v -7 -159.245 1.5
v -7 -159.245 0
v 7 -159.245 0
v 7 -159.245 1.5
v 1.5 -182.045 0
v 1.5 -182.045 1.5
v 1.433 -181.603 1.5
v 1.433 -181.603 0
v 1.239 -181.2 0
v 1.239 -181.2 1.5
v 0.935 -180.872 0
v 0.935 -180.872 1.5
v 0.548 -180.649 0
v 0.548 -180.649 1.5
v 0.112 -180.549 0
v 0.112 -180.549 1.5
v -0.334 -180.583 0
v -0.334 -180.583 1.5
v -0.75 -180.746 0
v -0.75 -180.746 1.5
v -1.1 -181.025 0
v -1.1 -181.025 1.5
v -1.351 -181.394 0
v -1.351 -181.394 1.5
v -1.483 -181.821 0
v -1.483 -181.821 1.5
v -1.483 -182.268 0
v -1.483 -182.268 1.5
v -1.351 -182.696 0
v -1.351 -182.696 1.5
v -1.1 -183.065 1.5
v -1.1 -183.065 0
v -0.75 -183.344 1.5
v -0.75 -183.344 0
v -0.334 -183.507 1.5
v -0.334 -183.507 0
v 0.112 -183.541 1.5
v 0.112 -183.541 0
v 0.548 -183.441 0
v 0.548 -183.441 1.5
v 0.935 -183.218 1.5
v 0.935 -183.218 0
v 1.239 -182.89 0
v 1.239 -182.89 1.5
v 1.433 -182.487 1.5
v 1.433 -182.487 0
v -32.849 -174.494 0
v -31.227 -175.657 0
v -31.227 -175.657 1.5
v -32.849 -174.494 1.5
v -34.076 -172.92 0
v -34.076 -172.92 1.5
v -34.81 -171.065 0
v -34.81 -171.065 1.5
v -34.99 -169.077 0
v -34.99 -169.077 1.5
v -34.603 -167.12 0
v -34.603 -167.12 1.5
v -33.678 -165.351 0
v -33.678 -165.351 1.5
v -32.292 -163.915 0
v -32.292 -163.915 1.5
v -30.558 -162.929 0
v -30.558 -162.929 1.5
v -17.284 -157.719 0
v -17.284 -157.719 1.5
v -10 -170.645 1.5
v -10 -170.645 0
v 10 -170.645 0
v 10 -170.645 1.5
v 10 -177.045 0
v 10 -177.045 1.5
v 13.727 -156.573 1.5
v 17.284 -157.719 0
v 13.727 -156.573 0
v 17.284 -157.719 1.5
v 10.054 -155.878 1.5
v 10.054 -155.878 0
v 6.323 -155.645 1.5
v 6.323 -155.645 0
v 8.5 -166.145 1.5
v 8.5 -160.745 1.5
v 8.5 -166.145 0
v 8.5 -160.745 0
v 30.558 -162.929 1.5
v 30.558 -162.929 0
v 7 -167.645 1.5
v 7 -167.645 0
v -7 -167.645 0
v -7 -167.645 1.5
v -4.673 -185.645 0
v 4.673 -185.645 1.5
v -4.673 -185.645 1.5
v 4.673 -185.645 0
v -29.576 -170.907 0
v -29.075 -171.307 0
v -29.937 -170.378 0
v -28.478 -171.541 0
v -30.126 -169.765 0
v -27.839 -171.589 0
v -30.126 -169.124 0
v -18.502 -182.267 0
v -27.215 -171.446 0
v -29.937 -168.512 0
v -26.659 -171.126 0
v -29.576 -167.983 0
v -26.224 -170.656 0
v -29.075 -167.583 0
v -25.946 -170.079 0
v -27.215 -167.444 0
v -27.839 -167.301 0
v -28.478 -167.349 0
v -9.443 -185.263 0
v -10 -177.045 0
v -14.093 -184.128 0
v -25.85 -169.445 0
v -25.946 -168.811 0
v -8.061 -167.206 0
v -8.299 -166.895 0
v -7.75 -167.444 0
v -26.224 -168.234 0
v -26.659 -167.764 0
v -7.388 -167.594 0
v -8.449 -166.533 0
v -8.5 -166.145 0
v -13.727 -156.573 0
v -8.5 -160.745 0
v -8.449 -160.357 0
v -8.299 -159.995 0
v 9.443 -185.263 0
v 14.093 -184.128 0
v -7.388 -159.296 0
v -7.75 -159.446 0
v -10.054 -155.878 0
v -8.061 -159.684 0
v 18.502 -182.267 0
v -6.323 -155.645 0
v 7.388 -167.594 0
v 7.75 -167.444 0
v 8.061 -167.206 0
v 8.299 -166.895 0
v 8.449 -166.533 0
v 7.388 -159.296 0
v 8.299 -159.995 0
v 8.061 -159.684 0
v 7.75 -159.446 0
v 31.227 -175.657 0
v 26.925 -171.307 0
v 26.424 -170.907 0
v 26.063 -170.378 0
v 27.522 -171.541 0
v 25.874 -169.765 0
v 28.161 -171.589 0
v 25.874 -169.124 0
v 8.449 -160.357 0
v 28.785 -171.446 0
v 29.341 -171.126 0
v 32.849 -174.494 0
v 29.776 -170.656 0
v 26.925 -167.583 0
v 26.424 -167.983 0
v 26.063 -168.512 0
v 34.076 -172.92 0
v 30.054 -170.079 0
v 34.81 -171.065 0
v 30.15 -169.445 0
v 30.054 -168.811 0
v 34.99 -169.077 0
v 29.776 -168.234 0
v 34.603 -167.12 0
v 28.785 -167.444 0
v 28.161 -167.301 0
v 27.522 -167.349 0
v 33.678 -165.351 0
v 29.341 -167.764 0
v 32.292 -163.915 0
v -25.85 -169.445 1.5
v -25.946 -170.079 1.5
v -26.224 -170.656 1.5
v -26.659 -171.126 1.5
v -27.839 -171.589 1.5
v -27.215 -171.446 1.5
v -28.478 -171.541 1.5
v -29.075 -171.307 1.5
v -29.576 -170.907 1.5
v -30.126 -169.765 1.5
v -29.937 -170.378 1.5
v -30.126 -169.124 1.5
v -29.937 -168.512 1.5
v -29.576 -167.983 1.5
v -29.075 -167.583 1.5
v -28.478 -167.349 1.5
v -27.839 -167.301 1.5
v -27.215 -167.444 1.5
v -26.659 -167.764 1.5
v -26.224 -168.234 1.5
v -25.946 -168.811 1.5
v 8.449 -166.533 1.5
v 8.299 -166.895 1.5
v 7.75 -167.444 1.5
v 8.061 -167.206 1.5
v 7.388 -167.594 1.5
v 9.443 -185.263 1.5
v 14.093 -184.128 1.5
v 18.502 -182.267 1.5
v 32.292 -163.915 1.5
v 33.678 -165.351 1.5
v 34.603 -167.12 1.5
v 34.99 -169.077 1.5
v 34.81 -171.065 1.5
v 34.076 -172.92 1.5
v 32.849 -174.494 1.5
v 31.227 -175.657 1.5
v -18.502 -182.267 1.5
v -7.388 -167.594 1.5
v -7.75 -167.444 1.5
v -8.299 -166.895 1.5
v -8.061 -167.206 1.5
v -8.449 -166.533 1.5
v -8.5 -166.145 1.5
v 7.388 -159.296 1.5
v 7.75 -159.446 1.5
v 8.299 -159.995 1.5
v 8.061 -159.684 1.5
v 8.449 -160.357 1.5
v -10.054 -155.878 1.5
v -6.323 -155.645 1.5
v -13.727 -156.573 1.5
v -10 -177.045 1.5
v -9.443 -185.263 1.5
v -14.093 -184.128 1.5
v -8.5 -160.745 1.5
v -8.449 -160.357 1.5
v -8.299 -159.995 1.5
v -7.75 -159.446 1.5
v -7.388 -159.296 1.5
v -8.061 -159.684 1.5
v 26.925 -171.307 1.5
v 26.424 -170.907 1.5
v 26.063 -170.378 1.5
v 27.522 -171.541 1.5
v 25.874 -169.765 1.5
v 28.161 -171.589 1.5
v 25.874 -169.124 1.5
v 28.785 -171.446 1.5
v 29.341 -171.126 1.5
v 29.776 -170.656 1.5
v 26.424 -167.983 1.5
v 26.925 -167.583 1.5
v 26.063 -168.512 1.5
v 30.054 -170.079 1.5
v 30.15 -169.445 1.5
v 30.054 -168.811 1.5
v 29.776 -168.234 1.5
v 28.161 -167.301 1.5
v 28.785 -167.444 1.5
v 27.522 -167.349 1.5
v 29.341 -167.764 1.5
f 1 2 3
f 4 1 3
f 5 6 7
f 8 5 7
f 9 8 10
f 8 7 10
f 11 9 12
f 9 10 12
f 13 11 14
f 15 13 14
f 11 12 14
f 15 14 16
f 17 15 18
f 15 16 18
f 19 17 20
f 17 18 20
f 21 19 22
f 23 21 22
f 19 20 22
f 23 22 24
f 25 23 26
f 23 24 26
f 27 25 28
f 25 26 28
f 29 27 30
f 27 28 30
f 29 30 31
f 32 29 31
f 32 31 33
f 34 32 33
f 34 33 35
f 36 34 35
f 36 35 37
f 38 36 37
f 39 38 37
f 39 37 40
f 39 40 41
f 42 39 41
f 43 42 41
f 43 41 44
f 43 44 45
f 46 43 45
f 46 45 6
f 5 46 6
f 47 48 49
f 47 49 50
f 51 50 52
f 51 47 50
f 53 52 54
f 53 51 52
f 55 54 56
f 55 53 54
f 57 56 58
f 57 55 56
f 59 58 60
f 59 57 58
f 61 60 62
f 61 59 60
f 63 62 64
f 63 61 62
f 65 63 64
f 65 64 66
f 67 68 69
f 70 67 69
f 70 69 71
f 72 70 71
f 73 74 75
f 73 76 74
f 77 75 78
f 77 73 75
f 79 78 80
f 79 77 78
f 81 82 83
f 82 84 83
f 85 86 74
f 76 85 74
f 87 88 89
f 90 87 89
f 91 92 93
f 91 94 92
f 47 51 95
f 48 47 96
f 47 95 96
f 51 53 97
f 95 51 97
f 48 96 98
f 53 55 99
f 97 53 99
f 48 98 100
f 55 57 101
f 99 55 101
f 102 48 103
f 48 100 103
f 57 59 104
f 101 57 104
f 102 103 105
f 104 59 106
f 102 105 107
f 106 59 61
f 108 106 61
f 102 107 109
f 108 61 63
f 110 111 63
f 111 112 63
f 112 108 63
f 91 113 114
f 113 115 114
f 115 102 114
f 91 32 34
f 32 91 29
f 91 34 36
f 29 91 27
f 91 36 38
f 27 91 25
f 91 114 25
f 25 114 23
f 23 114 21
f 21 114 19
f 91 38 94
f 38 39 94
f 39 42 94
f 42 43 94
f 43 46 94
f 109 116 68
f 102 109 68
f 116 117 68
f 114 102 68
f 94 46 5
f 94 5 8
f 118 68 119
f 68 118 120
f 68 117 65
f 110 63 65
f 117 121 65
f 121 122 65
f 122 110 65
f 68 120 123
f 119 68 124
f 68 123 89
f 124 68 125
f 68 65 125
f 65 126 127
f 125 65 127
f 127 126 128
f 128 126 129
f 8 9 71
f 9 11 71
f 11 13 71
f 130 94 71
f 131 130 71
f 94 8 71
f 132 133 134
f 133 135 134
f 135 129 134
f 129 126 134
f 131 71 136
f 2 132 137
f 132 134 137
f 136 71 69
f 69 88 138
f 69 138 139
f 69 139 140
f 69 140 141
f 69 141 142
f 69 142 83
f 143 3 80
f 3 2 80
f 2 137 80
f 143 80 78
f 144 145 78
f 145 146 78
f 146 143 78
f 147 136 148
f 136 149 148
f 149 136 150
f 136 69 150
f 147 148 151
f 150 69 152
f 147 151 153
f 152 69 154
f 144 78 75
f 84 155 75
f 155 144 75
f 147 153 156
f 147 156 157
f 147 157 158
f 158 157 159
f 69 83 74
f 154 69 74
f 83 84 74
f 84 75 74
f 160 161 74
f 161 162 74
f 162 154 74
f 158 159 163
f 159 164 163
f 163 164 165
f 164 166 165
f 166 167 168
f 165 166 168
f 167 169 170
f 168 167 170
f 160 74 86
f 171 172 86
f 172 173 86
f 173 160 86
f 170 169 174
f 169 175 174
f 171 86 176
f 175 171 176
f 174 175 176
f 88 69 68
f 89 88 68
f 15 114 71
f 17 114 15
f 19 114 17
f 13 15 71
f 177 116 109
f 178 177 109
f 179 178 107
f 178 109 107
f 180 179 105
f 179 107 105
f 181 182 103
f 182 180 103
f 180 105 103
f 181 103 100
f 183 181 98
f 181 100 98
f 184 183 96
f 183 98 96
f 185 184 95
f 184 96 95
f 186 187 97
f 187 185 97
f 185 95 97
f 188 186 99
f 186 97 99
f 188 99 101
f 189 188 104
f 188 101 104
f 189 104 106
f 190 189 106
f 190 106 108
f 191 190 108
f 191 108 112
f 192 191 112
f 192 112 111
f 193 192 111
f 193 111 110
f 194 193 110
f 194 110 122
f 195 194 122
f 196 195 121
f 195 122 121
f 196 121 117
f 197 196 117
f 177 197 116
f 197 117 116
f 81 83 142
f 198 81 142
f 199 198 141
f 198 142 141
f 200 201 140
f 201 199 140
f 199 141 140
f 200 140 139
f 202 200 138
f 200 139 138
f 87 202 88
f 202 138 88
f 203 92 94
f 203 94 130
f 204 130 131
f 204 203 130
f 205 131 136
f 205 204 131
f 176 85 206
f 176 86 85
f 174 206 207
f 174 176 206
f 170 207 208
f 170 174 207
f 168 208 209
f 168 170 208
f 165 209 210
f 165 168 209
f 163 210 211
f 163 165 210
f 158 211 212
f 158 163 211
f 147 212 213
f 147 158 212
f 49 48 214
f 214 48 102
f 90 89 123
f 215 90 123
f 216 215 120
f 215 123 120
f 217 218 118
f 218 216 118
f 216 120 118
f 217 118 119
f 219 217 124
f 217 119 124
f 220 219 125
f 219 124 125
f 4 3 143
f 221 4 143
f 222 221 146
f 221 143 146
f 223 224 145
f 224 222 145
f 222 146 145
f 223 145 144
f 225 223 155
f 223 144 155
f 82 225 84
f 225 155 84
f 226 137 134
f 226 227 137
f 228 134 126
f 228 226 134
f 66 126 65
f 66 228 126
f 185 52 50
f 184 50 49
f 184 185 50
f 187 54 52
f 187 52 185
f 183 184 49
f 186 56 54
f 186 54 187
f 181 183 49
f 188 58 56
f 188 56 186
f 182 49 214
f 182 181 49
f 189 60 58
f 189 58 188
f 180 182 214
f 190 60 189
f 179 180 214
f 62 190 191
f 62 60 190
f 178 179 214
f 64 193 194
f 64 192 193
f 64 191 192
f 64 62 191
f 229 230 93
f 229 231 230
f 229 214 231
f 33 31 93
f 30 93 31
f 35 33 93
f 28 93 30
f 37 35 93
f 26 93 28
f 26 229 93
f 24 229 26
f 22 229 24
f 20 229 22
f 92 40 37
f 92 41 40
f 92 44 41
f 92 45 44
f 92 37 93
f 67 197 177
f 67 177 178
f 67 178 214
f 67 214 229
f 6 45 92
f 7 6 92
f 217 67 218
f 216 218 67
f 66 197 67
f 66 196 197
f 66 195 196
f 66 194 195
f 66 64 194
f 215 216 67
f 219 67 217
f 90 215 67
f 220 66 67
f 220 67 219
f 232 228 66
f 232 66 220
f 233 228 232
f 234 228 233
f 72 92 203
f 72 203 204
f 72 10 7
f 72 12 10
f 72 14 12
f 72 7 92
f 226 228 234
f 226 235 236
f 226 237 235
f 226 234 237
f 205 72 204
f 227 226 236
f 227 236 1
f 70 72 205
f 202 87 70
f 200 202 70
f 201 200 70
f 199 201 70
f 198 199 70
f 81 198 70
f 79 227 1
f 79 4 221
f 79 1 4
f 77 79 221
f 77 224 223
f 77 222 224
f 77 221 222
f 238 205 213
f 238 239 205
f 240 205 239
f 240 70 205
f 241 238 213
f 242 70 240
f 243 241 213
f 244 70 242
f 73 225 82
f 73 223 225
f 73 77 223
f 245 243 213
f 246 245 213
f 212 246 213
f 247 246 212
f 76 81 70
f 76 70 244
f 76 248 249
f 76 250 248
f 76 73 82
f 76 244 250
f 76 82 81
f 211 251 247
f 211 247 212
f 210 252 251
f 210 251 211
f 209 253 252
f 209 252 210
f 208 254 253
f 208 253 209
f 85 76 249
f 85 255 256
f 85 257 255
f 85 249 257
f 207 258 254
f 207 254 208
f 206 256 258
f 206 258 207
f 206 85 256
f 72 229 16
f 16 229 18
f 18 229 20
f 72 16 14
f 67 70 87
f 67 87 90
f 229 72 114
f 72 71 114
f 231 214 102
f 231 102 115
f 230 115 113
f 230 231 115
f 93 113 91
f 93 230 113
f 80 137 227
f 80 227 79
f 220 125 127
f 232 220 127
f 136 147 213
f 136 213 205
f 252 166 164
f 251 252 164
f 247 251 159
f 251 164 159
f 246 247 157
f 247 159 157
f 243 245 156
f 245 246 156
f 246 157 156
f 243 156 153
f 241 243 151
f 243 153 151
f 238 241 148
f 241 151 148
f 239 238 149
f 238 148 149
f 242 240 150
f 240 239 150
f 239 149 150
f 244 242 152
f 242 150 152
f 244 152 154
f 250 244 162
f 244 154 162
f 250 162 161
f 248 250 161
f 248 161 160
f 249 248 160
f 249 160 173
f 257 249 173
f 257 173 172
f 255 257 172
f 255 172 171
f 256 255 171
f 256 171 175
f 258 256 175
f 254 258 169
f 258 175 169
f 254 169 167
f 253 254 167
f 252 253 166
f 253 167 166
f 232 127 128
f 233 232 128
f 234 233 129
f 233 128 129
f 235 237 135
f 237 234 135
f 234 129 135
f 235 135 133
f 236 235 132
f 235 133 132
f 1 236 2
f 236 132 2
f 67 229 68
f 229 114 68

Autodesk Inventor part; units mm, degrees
ref_plane "YZ Plane" through (0, 0, 0) normal (1, 0, 0) x (0, 1, 0)
ref_plane "XZ Plane" through (0, 0, 0) normal (0, 1, 0) x (-1, 0, 0)
ref_plane "XY Plane" through (0, 0, 0) normal (0, 0, 1) x (1, 0, 0)
ref_plane "Work Plane1" through (0, 0, 0) normal (0, 0, 1) x (1, 0, 0)
sketch "Sketch1" plane through (0, 0, 0) normal (0, 0, 1) x (1, 0, 0)
  arc A0 (-148.6847, 77.7603) -> (-148.1357, 75.7112) centre (-147.3857, 77.0103) ccw projected
  line L0 (-148.6847, 77.7603) -> (-148.1847, 78.6263) projected
  line L1 (-148.1847, 78.6263) -> (-150.7828, 80.1263) projected
  line L2 (-150.7828, 80.1263) -> (-152.7828, 76.6622) projected
  arc A1 (-155.3809, 78.1622) -> (-152.7828, 76.6622) centre (-154.0818, 77.4122) ccw projected
  line L3 (-155.3809, 78.1622) -> (-158.3253, 79.8622) projected
  arc A2 (-156.8253, 82.4603) -> (-158.3253, 79.8622) centre (-157.5753, 81.1612) ccw projected
  line L4 (-156.8253, 82.4603) -> (-156.3253, 83.3263) projected
  line L5 (-156.3253, 83.3263) -> (-161.1751, 86.1263) projected
  arc A3 (-159.9251, 88.2913) -> (-161.1751, 86.1263) centre (-160.5501, 87.2088) ccw projected
  line L6 (-159.9251, 88.2913) -> (-155.0753, 85.4913) projected
  line L7 (-155.0753, 85.4913) -> (-151.5753, 91.5535) projected
  line L8 (-151.5753, 91.5535) -> (-156.4251, 94.3535) projected
  arc A4 (-155.1751, 96.5186) -> (-156.4251, 94.3535) centre (-155.8001, 95.4361) ccw projected
  line L9 (-155.1751, 96.5186) -> (-150.3253, 93.7186) projected
  line L10 (-150.3253, 93.7186) -> (-149.8253, 94.5846) projected
  arc A5 (-148.3253, 97.1827) -> (-149.8253, 94.5846) centre (-149.0753, 95.8836) ccw projected
  line L11 (-148.3253, 97.1827) -> (-145.3809, 95.4827) projected
  arc A6 (-142.7828, 93.9827) -> (-145.3809, 95.4827) centre (-144.0818, 94.7327) ccw projected
  line L12 (-142.7828, 93.9827) -> (-144.7828, 90.5186) projected
  line L13 (-144.7828, 90.5186) -> (-142.1847, 89.0186) projected
  line L14 (-142.1847, 89.0186) -> (-141.6847, 89.8846) projected
  arc A7 (-139.6357, 90.4336) -> (-141.6847, 89.8846) centre (-140.3857, 89.1346) ccw projected
  line L15 (-139.6357, 90.4336) -> (-134.9591, 87.7336) projected
  arc A8 (-134.4101, 85.6846) -> (-134.9591, 87.7336) centre (-135.7091, 86.4346) ccw projected
  line L16 (-134.4101, 85.6846) -> (-136.9101, 81.3545) projected
  line L17 (-136.9101, 81.3545) -> (-133.7924, 79.5545) projected
  arc A9 (-135.7924, 76.0904) -> (-133.7924, 79.5545) centre (-134.7924, 77.8224) ccw projected
  line L18 (-135.7924, 76.0904) -> (-138.9101, 77.8904) projected
  line L19 (-138.9101, 77.8904) -> (-141.4101, 73.5603) projected
  arc A10 (-143.4591, 73.0112) -> (-141.4101, 73.5603) centre (-142.7091, 74.3103) ccw projected
  line L20 (-143.4591, 73.0112) -> (-148.1357, 75.7112) projected
  arc A11 (141.6847, 89.8846) -> (139.6357, 90.4336) centre (140.3857, 89.1346) ccw projected
  line L21 (141.6847, 89.8846) -> (142.1847, 89.0186) projected
  line L22 (142.1847, 89.0186) -> (144.7828, 90.5186) projected
  line L23 (144.7828, 90.5186) -> (142.7828, 93.9827) projected
  arc A12 (145.3809, 95.4827) -> (142.7828, 93.9827) centre (144.0818, 94.7327) ccw projected
  line L24 (145.3809, 95.4827) -> (148.3253, 97.1827) projected
  arc A13 (149.8253, 94.5846) -> (148.3253, 97.1827) centre (149.0753, 95.8836) ccw projected
  line L25 (149.8253, 94.5846) -> (150.3253, 93.7186) projected
  line L26 (150.3253, 93.7186) -> (155.1751, 96.5186) projected
  arc A14 (156.4251, 94.3535) -> (155.1751, 96.5186) centre (155.8001, 95.4361) ccw projected
  line L27 (156.4251, 94.3535) -> (151.5753, 91.5535) projected
  line L28 (151.5753, 91.5535) -> (155.0753, 85.4913) projected
  line L29 (155.0753, 85.4913) -> (159.9251, 88.2913) projected
  arc A15 (161.1751, 86.1263) -> (159.9251, 88.2913) centre (160.5501, 87.2088) ccw projected
  line L30 (161.1751, 86.1263) -> (156.3253, 83.3263) projected
  line L31 (156.3253, 83.3263) -> (156.8253, 82.4603) projected
  arc A16 (158.3253, 79.8622) -> (156.8253, 82.4603) centre (157.5753, 81.1612) ccw projected
  line L32 (158.3253, 79.8622) -> (155.3809, 78.1622) projected
  arc A17 (152.7828, 76.6622) -> (155.3809, 78.1622) centre (154.0818, 77.4122) ccw projected
  line L33 (152.7828, 76.6622) -> (150.7828, 80.1263) projected
  line L34 (150.7828, 80.1263) -> (148.1847, 78.6263) projected
  line L35 (148.1847, 78.6263) -> (148.6847, 77.7603) projected
  arc A18 (148.1357, 75.7112) -> (148.6847, 77.7603) centre (147.3857, 77.0103) ccw projected
  line L36 (148.1357, 75.7112) -> (143.4591, 73.0112) projected
  arc A19 (141.4101, 73.5603) -> (143.4591, 73.0112) centre (142.7091, 74.3103) ccw projected
  line L37 (141.4101, 73.5603) -> (138.9101, 77.8904) projected
  line L38 (138.9101, 77.8904) -> (135.7924, 76.0904) projected
  arc A20 (133.7924, 79.5545) -> (135.7924, 76.0904) centre (134.7924, 77.8224) ccw projected
  line L39 (133.7924, 79.5545) -> (136.9101, 81.3545) projected
  line L40 (136.9101, 81.3545) -> (134.4101, 85.6846) projected
  arc A21 (134.9591, 87.7336) -> (134.4101, 85.6846) centre (135.7091, 86.4346) ccw projected
  line L41 (134.9591, 87.7336) -> (139.6357, 90.4336) projected
  line L42 (6, -167.6449) -> (6, -170.6449) projected
  line L43 (6, -170.6449) -> (10, -170.6449) projected
  arc A22 (10, -173.6449) -> (10, -170.6449) centre (10, -172.1449) ccw projected
  line L44 (10, -173.6449) -> (10, -177.0449) projected
  arc A23 (7, -177.0449) -> (10, -177.0449) centre (8.5, -177.0449) ccw projected
  line L45 (7, -177.0449) -> (6, -177.0449) projected
  line L46 (6, -177.0449) -> (6, -182.6449) projected
  arc A24 (3.5, -182.6449) -> (6, -182.6449) centre (4.75, -182.6449) ccw projected
  line L47 (3.5, -182.6449) -> (3.5, -177.0449) projected
  line L48 (3.5, -177.0449) -> (-3.5, -177.0449) projected
  line L49 (-3.5, -177.0449) -> (-3.5, -182.6449) projected
  arc A25 (-6, -182.6449) -> (-3.5, -182.6449) centre (-4.75, -182.6449) ccw projected
  line L50 (-6, -182.6449) -> (-6, -177.0449) projected
  line L51 (-6, -177.0449) -> (-7, -177.0449) projected
  arc A26 (-10, -177.0449) -> (-7, -177.0449) centre (-8.5, -177.0449) ccw projected
  line L52 (-10, -177.0449) -> (-10, -173.6449) projected
  arc A27 (-10, -170.6449) -> (-10, -173.6449) centre (-10, -172.1449) ccw projected
  line L53 (-10, -170.6449) -> (-6, -170.6449) projected
  line L54 (-6, -170.6449) -> (-6, -167.6449) projected
  line L55 (-6, -167.6449) -> (-7, -167.6449) projected
  arc A28 (-8.5, -166.1449) -> (-7, -167.6449) centre (-7, -166.1449) ccw projected
  line L56 (-8.5, -166.1449) -> (-8.5, -160.7449) projected
  arc A29 (-7, -159.2449) -> (-8.5, -160.7449) centre (-7, -160.7449) ccw projected
  line L57 (-7, -159.2449) -> (-2, -159.2449) projected
  line L58 (-2, -159.2449) -> (-2, -155.6449) projected
  arc A30 (2, -155.6449) -> (-2, -155.6449) centre (0, -155.6449) ccw projected
  line L59 (2, -155.6449) -> (2, -159.2449) projected
  line L60 (2, -159.2449) -> (7, -159.2449) projected
  arc A31 (8.5, -160.7449) -> (7, -159.2449) centre (7, -160.7449) ccw projected
  line L61 (8.5, -160.7449) -> (8.5, -166.1449) projected
  arc A32 (7, -167.6449) -> (8.5, -166.1449) centre (7, -166.1449) ccw projected
  line L62 (7, -167.6449) -> (6, -167.6449) projected
  arc A33 (174.3732, -22.7321) -> (67.5, 162.3777) centre (67.5, 38.9711) ccw projected
  line L63 (67.5, 162.3777) -> (-67.5, 162.3777) projected
  arc A34 (-67.5, 162.3777) -> (-174.3732, -22.7321) centre (-67.5, 38.9711) ccw projected
  line L64 (-174.3732, -22.7321) -> (-106.8732, -139.6455) projected
  arc A35 (-106.8732, -139.6455) -> (106.8732, -139.6455) centre (0, -77.9423) ccw projected
  line L65 (106.8732, -139.6455) -> (174.3732, -22.7321) projected
  circle A36 centre (160.7436, 60.4737) radius 2 projected
  circle A37 centre (132.7436, 108.9711) radius 2 projected
  circle A38 centre (-160.7436, 60.4737) radius 2 projected
  circle A39 centre (-132.7436, 108.9711) radius 2 projected
  circle A40 centre (28, -169.4449) radius 2 projected
  circle A41 centre (-28, -169.4449) radius 2 projected
  circle A42 centre (0, 0) radius 5 projected
  circle A43 centre (-28, -169.4449) radius 7
  circle A44 centre (28, -169.4449) radius 7
  line L66 (-12, -155.6449) -> (12, -155.6449)
  line L67 (12, -155.6449) -> (12, -185.6449)
  line L68 (12, -185.6449) -> (-12, -185.6449)
  line L69 (-12, -185.6449) -> (-12, -155.6449)
  line L70 (-30.5576, -162.9288) -> (-12, -155.6449)
  line L71 (-31.227, -175.6567) -> (-12, -185.6449)
  line L72 (31.227, -175.6567) -> (12, -185.6449)
  line L73 (30.5576, -162.9288) -> (12, -155.6449)
  line L74 (-7, -159.2449) -> (7, -159.2449)
  line L75 (8.5, -160.7449) -> (8.5, -166.1449)
  line L76 (7, -167.6449) -> (-7, -167.6449)
  line L77 (-8.5, -166.1449) -> (-8.5, -160.7449)
  line L78 (-10, -170.6449) -> (10, -170.6449)
  line L79 (10, -170.6449) -> (10, -177.0449)
  line L80 (10, -177.0449) -> (-10, -177.0449)
  line L81 (-10, -177.0449) -> (-10, -170.6449)
  arc A45 (-7, -159.2449) -> (-8.5, -160.7449) centre (-7, -160.7449) ccw
  arc A46 (-8.5, -166.1449) -> (-7, -167.6449) centre (-7, -166.1449) ccw
  arc A47 (7, -167.6449) -> (8.5, -166.1449) centre (7, -166.1449) ccw
  arc A48 (8.5, -160.7449) -> (7, -159.2449) centre (7, -160.7449) ccw
  circle A49 centre (-28, -169.4449) radius 2.15
  circle A50 centre (28, -169.4449) radius 2.15
  point P0 (0, 0)
  dimension "d2" = 14
  dimension "d3" = 14
  dimension "d5" = 30
  dimension "d6" = 2
  dimension "d7" = 2
  dimension "d8" = 1.5
  dimension "d16" = 4.3
  dimension "d17" = 4.3
extrude "Extrusion1" add sketch "Sketch1" along normal blind 1.5 contours L62 A32 L61 A31 L60 L59 L66 L67 L68 L69 L58 L57 A29 L56 A28 L55 L54 L53 A27 L52 A26 L51 L50 A25 L49 L48 L47 A24 L46 L45 A23 L44 A22 L43 L42 | L42 L78 L54 L76 | A22 L79 | L81 A27 | A23 L80 | L80 A26 | L74 L58 L66 L59 | L46 A24 L47 L80 | L80 L49 A25 L50 | L73 A44 L72 L67 | L69 L71 A43 L70 | A44 | A43
fillet "Fillet1" radius 30 4 edges at (-12, -185.6449, 0.75) (12, -185.6449, 0.75) (-12, -155.6449, 0.75) (12, -155.6449, 0.75)
sketch "Sketch2" plane through (0, 0, 1.5) normal (0, 0, 1) x (1, 0, 0)
  line L0 (10, -177.0449) -> (-10, -177.0449) projected
  circle A0 centre (0, -182.0449) radius 1.5
  point P0 (0, 0)
  dimension "d12" = 3
  dimension "d13" = 5
extrude "Extrusion2" cut sketch "Sketch2" against normal blind 10
properties material "Stainless Steel"
